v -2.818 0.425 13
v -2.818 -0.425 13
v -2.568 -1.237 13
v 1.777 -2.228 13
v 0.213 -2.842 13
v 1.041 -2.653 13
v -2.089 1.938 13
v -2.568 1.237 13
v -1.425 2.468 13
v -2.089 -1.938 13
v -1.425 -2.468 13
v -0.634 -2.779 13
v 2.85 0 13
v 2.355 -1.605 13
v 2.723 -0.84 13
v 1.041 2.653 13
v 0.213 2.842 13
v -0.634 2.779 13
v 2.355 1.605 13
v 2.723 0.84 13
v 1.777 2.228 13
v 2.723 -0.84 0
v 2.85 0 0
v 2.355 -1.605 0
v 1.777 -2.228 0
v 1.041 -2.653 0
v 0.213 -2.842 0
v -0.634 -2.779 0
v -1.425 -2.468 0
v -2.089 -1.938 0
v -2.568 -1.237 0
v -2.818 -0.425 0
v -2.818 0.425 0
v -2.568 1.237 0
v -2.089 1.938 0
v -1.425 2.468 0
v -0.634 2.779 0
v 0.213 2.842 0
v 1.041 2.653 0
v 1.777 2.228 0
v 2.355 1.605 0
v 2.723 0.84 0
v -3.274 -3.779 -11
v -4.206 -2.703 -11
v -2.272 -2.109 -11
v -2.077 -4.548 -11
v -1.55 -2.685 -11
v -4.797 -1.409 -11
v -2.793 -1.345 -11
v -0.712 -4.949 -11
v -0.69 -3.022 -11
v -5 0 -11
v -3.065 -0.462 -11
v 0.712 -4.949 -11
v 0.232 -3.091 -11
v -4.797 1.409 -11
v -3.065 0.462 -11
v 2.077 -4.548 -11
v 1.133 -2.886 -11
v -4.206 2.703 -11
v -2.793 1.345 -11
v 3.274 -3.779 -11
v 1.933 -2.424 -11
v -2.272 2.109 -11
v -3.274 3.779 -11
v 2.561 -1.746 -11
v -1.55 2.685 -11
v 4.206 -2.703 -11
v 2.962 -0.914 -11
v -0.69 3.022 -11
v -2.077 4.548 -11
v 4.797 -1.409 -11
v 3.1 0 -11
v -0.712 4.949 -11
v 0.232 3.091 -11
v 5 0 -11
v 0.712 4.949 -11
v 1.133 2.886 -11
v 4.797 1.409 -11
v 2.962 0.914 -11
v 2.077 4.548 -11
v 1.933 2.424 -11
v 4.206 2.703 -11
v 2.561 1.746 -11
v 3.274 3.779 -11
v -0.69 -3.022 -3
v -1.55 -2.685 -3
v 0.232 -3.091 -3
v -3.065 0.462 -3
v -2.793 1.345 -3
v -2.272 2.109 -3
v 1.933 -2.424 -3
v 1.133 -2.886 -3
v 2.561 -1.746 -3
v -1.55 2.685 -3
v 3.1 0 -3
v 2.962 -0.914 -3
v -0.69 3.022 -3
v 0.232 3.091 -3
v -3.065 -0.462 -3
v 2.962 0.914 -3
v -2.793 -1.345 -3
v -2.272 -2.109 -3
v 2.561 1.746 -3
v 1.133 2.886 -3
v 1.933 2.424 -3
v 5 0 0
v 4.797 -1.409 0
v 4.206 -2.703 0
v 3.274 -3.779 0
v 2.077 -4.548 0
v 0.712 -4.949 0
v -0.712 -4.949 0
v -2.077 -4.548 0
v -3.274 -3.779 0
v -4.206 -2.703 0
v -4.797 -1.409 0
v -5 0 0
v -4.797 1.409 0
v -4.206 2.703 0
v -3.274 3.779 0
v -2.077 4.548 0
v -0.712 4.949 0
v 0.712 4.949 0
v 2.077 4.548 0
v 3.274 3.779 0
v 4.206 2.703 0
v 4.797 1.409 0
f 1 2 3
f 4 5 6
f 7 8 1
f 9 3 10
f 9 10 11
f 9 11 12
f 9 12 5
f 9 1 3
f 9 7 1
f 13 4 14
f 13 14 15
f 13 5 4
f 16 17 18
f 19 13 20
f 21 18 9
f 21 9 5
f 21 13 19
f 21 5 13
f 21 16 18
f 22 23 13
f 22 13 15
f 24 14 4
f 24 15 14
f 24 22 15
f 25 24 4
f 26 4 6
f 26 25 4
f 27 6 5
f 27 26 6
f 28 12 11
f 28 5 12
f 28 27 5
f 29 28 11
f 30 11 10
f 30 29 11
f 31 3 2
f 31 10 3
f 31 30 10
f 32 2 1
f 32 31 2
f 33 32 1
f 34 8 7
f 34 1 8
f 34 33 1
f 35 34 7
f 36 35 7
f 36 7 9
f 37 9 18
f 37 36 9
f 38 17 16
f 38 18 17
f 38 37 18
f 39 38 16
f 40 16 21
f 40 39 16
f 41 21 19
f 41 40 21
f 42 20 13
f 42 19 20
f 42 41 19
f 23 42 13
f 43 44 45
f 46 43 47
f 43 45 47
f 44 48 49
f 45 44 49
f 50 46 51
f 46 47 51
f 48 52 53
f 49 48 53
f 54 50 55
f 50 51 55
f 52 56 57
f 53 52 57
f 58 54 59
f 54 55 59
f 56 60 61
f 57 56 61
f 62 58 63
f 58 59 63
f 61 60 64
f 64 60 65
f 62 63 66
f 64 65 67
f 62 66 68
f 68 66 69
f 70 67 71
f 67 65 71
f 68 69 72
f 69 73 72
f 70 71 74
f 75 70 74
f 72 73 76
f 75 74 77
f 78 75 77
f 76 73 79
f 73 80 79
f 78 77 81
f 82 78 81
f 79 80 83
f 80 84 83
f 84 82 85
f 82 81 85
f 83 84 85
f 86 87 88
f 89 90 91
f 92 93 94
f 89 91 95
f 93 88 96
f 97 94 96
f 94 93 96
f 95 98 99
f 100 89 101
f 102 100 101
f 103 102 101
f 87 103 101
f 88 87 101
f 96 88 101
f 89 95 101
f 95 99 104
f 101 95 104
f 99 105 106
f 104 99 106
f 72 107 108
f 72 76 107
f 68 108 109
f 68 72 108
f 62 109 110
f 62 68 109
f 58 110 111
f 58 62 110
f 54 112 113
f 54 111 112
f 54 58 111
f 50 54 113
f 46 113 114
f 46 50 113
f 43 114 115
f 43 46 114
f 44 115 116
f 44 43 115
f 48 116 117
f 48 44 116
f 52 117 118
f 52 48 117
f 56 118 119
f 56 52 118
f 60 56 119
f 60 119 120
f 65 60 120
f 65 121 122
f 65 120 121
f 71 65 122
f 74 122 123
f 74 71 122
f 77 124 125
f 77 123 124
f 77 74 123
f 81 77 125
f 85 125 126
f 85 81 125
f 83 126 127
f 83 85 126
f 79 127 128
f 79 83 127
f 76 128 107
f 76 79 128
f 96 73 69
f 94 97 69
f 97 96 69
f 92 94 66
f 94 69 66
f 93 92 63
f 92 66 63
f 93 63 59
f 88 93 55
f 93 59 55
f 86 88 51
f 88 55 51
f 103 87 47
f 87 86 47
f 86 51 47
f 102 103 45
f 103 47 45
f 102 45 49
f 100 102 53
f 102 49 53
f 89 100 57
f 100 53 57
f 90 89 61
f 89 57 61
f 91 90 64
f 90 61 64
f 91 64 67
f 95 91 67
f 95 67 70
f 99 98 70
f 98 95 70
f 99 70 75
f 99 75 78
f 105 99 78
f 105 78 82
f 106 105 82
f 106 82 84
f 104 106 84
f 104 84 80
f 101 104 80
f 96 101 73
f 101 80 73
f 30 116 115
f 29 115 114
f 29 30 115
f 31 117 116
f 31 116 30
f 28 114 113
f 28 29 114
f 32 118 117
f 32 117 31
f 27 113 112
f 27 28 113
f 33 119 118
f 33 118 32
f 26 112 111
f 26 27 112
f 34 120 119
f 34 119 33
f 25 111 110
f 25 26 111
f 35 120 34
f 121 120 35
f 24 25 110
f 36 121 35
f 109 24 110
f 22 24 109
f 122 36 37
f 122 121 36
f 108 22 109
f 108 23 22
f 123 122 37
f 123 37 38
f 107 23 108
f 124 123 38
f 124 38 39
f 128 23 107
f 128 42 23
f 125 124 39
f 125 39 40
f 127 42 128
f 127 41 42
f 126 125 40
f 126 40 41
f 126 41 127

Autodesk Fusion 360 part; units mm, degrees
sketch "Sketch1" plane through (0, 0, 0) normal (0, 0, 1) x (1, 0, 0)
  circle A0 centre (0, 0) radius 2.85
  circle A1 centre (0, 0) radius 5
  dimension "d1" = 5.7
  dimension "d2" = 10
extrude "Extrude1" add sketch "Sketch1" along normal blind 13 contours A0
ref_plane "WorkPlane1" through (0, 0, -11) normal (0, 0, 1) x (1, 0, 0)
sketch "Sketch2" plane through (0, 0, -11) normal (0, 0, 1) x (1, 0, 0)
  circle A0 centre (0, 0) radius 5
  circle A1 centre (0, 0) radius 3.1
  dimension "d6" = 10
  dimension "d7" = 6.2
extrude "Extrude2" add sketch "Sketch2" along normal blind 11 contours A0 | A1
extrude "Extrude3" cut sketch "Sketch2" along normal blind 8 contours A1
